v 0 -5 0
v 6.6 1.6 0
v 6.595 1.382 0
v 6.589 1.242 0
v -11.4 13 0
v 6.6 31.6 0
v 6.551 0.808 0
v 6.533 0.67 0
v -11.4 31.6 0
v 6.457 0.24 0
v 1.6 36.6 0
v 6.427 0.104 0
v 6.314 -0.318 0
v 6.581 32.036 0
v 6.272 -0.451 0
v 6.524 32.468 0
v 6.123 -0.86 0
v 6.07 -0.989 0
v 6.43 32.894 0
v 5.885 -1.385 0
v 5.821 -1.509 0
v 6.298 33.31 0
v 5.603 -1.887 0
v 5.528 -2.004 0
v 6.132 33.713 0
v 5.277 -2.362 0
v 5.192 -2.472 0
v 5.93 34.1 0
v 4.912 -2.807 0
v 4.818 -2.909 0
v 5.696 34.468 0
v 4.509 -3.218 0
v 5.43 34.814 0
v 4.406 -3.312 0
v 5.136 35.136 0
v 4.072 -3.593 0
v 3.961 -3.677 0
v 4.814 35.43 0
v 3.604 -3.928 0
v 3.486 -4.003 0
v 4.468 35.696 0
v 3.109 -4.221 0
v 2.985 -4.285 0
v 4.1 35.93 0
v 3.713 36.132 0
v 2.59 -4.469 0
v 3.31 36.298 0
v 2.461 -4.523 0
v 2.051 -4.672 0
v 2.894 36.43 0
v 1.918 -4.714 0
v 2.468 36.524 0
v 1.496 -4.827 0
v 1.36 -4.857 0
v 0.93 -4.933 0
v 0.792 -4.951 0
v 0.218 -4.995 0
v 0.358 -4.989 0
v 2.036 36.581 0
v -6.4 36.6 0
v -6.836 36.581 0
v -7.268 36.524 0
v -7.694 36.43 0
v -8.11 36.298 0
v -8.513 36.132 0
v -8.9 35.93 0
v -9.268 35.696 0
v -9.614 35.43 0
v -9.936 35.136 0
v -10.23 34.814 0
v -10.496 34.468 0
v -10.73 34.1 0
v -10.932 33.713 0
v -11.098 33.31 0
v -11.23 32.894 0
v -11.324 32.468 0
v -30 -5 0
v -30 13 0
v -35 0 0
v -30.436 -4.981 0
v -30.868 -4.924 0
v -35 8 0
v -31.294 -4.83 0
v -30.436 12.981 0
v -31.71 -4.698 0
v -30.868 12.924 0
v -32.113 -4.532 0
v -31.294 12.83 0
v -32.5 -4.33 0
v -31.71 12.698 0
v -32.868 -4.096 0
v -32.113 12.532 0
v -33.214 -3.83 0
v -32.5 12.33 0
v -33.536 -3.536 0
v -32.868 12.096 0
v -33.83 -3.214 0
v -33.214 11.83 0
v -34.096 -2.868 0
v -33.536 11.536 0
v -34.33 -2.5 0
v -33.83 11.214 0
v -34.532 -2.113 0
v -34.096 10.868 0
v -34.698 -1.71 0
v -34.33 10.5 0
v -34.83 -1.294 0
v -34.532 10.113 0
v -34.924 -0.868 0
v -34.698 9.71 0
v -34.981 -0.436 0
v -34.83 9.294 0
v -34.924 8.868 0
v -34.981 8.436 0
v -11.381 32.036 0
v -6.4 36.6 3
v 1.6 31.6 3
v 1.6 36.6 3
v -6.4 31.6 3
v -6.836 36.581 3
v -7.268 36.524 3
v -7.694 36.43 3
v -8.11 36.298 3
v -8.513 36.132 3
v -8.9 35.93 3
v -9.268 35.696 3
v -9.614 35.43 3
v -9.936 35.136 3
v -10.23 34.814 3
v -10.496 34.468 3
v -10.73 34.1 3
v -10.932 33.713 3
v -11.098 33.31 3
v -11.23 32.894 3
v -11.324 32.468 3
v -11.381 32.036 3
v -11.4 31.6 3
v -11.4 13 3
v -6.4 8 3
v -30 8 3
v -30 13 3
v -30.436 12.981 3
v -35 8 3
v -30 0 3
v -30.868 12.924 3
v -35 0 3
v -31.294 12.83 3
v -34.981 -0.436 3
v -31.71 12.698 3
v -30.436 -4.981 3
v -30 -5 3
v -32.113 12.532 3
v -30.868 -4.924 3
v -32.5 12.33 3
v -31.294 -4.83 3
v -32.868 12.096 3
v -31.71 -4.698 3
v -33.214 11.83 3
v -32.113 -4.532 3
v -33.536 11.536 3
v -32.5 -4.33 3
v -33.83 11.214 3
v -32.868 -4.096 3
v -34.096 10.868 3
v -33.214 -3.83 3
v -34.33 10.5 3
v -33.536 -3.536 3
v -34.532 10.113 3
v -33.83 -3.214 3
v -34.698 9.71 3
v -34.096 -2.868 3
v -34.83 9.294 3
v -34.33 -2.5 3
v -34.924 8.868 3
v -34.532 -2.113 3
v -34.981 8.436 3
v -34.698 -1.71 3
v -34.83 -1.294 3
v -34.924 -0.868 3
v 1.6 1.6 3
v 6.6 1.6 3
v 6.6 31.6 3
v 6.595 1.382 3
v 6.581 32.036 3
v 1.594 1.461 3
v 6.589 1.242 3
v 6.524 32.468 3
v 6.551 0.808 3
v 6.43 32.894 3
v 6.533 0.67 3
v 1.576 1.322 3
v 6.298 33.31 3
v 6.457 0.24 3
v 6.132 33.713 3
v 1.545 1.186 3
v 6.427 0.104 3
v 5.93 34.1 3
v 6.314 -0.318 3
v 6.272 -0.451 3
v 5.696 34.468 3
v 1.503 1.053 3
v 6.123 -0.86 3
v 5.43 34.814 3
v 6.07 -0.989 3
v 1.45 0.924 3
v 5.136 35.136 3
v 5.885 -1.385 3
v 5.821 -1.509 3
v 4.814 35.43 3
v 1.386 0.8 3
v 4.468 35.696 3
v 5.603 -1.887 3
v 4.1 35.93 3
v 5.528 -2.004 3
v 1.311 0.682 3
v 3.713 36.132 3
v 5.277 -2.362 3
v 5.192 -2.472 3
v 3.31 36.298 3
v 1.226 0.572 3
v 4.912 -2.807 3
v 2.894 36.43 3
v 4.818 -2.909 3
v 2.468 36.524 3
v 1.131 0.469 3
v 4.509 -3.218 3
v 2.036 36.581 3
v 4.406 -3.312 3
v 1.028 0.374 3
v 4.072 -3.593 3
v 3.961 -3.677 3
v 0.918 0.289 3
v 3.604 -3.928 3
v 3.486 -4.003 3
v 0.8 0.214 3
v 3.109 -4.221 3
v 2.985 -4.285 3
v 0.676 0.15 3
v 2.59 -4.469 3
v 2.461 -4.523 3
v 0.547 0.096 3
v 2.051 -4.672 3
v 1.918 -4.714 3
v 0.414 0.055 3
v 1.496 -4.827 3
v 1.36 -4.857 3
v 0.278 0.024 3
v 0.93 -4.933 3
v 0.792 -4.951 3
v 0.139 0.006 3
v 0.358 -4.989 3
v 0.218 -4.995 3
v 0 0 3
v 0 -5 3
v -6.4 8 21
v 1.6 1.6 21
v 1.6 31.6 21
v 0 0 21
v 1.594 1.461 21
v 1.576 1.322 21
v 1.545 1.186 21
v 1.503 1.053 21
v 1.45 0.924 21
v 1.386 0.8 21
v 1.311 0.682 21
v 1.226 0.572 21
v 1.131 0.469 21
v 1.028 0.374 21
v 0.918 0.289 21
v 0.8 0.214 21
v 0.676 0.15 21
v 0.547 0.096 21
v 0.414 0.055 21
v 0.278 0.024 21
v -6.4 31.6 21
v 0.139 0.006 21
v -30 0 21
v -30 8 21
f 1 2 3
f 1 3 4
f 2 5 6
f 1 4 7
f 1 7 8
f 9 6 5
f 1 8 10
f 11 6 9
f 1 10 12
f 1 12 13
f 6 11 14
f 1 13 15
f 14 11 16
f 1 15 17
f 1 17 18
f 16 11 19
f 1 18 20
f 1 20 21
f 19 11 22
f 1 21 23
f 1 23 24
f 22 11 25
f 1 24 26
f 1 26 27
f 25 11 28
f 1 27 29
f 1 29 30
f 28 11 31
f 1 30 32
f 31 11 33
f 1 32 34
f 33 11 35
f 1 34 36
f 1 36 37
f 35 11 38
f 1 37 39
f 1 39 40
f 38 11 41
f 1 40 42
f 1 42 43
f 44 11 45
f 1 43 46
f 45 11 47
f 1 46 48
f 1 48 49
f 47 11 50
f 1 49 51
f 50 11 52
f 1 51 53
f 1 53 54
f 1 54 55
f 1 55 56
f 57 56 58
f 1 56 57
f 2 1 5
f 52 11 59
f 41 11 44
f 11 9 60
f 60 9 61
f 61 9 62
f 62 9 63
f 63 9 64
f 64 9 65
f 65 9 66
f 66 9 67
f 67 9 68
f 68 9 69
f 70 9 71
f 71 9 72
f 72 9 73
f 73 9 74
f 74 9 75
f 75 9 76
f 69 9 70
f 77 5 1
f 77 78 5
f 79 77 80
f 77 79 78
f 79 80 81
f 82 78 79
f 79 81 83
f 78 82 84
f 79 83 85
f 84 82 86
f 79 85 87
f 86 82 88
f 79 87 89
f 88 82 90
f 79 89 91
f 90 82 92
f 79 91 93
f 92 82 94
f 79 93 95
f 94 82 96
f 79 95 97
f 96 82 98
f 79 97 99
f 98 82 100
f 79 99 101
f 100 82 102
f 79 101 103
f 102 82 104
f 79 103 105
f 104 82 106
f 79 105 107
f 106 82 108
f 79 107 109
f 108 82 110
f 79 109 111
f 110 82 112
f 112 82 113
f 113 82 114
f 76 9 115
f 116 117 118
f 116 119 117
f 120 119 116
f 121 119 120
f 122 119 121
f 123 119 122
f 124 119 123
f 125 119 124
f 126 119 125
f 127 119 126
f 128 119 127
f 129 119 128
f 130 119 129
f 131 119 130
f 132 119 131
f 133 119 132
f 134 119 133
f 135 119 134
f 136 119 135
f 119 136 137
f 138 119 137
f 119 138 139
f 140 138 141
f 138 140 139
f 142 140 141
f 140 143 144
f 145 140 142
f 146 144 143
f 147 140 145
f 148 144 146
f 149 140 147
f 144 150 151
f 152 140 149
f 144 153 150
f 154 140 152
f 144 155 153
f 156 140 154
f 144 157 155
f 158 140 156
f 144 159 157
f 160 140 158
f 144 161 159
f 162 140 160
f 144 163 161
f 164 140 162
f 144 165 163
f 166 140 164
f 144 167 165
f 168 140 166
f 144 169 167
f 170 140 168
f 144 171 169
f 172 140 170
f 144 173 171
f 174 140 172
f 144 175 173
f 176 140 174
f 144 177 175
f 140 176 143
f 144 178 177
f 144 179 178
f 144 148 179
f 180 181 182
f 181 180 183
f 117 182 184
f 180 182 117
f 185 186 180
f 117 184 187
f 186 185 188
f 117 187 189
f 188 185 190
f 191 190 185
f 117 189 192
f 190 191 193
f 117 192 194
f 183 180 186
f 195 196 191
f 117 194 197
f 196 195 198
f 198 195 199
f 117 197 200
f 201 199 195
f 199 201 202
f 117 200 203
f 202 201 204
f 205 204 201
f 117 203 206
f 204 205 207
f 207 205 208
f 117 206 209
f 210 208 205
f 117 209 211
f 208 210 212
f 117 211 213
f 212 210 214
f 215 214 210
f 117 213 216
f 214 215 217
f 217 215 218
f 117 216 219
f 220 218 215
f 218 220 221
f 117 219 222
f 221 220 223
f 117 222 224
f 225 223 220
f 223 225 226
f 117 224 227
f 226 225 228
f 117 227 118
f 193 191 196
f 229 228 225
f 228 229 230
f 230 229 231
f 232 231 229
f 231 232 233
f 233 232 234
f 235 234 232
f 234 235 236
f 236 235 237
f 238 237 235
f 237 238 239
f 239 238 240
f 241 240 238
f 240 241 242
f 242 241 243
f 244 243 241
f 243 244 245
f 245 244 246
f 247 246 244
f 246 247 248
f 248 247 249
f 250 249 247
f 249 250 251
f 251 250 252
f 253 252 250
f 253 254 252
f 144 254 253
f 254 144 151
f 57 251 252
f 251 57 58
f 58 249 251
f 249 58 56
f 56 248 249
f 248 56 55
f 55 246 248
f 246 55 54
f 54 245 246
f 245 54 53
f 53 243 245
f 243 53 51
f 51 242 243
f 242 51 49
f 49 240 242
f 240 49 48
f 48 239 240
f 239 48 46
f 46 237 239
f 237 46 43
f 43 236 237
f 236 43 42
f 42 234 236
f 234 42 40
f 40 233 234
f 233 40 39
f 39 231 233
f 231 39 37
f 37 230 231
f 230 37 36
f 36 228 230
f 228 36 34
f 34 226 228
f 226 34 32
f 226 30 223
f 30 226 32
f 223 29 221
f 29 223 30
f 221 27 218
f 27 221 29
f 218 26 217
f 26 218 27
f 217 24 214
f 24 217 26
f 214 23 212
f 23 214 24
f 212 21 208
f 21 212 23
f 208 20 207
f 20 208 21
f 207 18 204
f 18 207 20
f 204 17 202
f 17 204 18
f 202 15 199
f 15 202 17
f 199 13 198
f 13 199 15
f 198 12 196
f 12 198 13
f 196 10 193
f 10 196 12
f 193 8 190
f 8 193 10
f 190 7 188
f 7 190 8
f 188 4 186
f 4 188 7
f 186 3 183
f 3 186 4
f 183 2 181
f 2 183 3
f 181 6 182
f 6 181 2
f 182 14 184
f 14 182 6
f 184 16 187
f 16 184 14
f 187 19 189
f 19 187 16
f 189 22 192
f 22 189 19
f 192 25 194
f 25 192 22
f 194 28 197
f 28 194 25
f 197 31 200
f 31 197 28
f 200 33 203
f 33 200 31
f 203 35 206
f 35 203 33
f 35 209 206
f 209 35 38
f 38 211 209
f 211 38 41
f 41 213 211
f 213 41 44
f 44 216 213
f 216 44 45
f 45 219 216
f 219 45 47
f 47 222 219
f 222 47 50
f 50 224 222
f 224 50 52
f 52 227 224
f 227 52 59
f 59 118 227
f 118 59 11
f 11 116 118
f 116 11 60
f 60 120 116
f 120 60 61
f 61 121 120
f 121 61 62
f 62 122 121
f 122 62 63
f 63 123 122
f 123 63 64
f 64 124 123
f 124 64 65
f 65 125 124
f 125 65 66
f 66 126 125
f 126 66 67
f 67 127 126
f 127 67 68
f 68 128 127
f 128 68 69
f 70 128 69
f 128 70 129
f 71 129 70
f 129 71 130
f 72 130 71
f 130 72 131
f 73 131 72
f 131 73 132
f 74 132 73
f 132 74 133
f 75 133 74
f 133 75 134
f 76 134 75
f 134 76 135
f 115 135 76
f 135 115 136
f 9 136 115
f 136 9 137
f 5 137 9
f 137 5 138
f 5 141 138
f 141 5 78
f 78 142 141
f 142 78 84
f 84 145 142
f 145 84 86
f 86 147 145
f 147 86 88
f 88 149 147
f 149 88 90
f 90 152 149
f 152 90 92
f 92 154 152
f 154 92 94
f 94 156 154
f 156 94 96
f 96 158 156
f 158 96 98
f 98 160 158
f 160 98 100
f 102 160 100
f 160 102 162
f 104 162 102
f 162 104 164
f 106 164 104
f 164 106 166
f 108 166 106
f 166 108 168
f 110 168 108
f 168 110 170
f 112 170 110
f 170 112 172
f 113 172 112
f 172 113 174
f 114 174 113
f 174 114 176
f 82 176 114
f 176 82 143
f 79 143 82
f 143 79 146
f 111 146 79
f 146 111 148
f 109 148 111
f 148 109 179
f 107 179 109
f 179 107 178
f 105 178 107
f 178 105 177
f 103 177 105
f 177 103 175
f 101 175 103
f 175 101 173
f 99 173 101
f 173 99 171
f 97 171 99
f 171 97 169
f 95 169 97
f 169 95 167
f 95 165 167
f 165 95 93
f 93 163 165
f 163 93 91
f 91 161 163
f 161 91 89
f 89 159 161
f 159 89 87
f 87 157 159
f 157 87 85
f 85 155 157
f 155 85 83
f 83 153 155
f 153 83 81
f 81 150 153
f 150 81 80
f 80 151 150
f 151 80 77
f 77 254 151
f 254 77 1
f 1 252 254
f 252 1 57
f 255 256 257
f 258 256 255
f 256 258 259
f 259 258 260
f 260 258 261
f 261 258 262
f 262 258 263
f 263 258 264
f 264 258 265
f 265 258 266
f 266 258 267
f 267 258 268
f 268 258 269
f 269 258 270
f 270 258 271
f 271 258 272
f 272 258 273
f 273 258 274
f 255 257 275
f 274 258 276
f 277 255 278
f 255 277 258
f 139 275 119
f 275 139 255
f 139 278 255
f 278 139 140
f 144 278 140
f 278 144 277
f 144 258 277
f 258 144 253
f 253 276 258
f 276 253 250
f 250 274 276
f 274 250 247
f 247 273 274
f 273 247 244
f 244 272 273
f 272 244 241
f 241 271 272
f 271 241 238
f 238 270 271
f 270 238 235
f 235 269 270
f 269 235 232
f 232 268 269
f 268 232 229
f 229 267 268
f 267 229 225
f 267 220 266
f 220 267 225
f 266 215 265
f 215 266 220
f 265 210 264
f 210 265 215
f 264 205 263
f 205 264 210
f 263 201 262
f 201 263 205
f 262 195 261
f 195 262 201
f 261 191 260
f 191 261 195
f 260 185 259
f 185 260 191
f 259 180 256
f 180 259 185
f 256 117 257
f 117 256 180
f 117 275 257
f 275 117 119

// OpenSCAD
//////////////////////////////////////////////////////////////////////
// LibFile: radius_calibration_coupon_contract.scad
// Project: Strap Bender
// FileGroup: Direct-Open F5 Contract Test
// FileSummary: Verifies printable radius-coupon records, datums, and resolution.
//////////////////////////////////////////////////////////////////////

include <../strap_bender.scad>
include <../registries/laboratory_strap_materials.scad>
include <../registries/laboratory_radius_coupons.scad>

coupon_r1_6 = named_record(
    LABORATORY_RADIUS_CALIBRATION_COUPONS,
    "ULINE_R90_TOOL_R1_6_EXPERIMENTAL",
    "radius calibration coupon"
);
coupon_r5 = named_record(
    LABORATORY_RADIUS_CALIBRATION_COUPONS,
    "ULINE_R90_TOOL_R5_EXPERIMENTAL",
    "radius calibration coupon"
);

validate_radius_calibration_coupon(
    coupon_r1_6,
    LABORATORY_STRAP_MATERIALS
);
validate_radius_calibration_coupon(
    coupon_r5,
    LABORATORY_STRAP_MATERIALS
);
report_radius_calibration_coupon(coupon_r1_6, "full");

assert(radius_coupon_name(coupon_r1_6) ==
    "ULINE_R90_TOOL_R1_6_EXPERIMENTAL",
    "Radius-coupon name accessor failed.");
assert(radius_coupon_strap_material_name(coupon_r1_6) ==
    "ULINE_S_1655_BLACK",
    "Radius-coupon material provenance failed.");
assert(abs(radius_coupon_tool_inside_radius_mm(coupon_r1_6) - 1.6) < 1e-9,
    "R1.6 reference coupon must preserve designed tool radius.");
assert(abs(radius_coupon_tool_inside_radius_mm(coupon_r5) - 5) < 1e-9,
    "R5 reference coupon must preserve designed tool radius.");
assert(radius_coupon_entry_tangent_point(coupon_r1_6) == [0, 0],
    "Radius-coupon entry tangent datum failed.");
assert(sb_point_distance(
        radius_coupon_exit_tangent_point(coupon_r1_6),
        [1.6, 1.6]
    ) < 0.000001,
    "R1.6 90-degree exit tangent datum failed.");
assert(sb_point_distance(
        radius_coupon_exit_leg_end(coupon_r1_6),
        [1.6, 31.6]
    ) < 0.000001,
    "R1.6 90-degree exit-leg endpoint failed.");
assert(radius_coupon_arc_segment_count(coupon_r1_6) >= 18,
    "R1.6 coupon must honor the five-degree maximum surface step.");
assert(radius_coupon_actual_surface_sagitta_mm(coupon_r1_6) <=
    radius_coupon_tool_surface_chord_error_mm(coupon_r1_6) + 1e-9,
    "R1.6 coupon surface must honor requested chord-error bound.");
assert(len(radius_coupon_outer_arc_points(coupon_r1_6)) ==
    radius_coupon_arc_segment_count(coupon_r1_6) + 1,
    "Radius-coupon outer arc must retain both tangent endpoints.");

right_turn = radius_calibration_coupon_spec(
    name = "SYNTHETIC_RIGHT_TURN_COUPON",
    strap_material_name = "ULINE_S_1655_BLACK",
    tool_inside_radius_mm = 2,
    bend_angle_degrees = -90,
    entry_tangent_mm = 20,
    exit_tangent_mm = 20,
    form_depth_mm = 6,
    form_height_mm = 18,
    base_thickness_mm = 3,
    base_margin_mm = 4,
    tool_surface_chord_error_mm = 0.02,
    tool_surface_max_angle_step_degrees = 5,
    notes = "Synthetic geometry contract only."
);
validate_radius_calibration_coupon(
    right_turn,
    LABORATORY_STRAP_MATERIALS
);
assert(sb_point_distance(
        radius_coupon_exit_tangent_point(right_turn),
        [2, -2]
    ) < 0.000001,
    "Negative-angle coupon must mirror the exit tangent datum.");
assert(sb_point_distance(
        radius_coupon_exit_leg_end(right_turn),
        [2, -22]
    ) < 0.000001,
    "Negative-angle coupon must mirror the exit tangent leg.");

// Render one reference coupon so F5 exercises the actual printable geometry.
render_radius_calibration_coupon(coupon_r1_6);

echo("STRAP BENDER RADIUS CALIBRATION COUPON CONTRACT: PASS");
